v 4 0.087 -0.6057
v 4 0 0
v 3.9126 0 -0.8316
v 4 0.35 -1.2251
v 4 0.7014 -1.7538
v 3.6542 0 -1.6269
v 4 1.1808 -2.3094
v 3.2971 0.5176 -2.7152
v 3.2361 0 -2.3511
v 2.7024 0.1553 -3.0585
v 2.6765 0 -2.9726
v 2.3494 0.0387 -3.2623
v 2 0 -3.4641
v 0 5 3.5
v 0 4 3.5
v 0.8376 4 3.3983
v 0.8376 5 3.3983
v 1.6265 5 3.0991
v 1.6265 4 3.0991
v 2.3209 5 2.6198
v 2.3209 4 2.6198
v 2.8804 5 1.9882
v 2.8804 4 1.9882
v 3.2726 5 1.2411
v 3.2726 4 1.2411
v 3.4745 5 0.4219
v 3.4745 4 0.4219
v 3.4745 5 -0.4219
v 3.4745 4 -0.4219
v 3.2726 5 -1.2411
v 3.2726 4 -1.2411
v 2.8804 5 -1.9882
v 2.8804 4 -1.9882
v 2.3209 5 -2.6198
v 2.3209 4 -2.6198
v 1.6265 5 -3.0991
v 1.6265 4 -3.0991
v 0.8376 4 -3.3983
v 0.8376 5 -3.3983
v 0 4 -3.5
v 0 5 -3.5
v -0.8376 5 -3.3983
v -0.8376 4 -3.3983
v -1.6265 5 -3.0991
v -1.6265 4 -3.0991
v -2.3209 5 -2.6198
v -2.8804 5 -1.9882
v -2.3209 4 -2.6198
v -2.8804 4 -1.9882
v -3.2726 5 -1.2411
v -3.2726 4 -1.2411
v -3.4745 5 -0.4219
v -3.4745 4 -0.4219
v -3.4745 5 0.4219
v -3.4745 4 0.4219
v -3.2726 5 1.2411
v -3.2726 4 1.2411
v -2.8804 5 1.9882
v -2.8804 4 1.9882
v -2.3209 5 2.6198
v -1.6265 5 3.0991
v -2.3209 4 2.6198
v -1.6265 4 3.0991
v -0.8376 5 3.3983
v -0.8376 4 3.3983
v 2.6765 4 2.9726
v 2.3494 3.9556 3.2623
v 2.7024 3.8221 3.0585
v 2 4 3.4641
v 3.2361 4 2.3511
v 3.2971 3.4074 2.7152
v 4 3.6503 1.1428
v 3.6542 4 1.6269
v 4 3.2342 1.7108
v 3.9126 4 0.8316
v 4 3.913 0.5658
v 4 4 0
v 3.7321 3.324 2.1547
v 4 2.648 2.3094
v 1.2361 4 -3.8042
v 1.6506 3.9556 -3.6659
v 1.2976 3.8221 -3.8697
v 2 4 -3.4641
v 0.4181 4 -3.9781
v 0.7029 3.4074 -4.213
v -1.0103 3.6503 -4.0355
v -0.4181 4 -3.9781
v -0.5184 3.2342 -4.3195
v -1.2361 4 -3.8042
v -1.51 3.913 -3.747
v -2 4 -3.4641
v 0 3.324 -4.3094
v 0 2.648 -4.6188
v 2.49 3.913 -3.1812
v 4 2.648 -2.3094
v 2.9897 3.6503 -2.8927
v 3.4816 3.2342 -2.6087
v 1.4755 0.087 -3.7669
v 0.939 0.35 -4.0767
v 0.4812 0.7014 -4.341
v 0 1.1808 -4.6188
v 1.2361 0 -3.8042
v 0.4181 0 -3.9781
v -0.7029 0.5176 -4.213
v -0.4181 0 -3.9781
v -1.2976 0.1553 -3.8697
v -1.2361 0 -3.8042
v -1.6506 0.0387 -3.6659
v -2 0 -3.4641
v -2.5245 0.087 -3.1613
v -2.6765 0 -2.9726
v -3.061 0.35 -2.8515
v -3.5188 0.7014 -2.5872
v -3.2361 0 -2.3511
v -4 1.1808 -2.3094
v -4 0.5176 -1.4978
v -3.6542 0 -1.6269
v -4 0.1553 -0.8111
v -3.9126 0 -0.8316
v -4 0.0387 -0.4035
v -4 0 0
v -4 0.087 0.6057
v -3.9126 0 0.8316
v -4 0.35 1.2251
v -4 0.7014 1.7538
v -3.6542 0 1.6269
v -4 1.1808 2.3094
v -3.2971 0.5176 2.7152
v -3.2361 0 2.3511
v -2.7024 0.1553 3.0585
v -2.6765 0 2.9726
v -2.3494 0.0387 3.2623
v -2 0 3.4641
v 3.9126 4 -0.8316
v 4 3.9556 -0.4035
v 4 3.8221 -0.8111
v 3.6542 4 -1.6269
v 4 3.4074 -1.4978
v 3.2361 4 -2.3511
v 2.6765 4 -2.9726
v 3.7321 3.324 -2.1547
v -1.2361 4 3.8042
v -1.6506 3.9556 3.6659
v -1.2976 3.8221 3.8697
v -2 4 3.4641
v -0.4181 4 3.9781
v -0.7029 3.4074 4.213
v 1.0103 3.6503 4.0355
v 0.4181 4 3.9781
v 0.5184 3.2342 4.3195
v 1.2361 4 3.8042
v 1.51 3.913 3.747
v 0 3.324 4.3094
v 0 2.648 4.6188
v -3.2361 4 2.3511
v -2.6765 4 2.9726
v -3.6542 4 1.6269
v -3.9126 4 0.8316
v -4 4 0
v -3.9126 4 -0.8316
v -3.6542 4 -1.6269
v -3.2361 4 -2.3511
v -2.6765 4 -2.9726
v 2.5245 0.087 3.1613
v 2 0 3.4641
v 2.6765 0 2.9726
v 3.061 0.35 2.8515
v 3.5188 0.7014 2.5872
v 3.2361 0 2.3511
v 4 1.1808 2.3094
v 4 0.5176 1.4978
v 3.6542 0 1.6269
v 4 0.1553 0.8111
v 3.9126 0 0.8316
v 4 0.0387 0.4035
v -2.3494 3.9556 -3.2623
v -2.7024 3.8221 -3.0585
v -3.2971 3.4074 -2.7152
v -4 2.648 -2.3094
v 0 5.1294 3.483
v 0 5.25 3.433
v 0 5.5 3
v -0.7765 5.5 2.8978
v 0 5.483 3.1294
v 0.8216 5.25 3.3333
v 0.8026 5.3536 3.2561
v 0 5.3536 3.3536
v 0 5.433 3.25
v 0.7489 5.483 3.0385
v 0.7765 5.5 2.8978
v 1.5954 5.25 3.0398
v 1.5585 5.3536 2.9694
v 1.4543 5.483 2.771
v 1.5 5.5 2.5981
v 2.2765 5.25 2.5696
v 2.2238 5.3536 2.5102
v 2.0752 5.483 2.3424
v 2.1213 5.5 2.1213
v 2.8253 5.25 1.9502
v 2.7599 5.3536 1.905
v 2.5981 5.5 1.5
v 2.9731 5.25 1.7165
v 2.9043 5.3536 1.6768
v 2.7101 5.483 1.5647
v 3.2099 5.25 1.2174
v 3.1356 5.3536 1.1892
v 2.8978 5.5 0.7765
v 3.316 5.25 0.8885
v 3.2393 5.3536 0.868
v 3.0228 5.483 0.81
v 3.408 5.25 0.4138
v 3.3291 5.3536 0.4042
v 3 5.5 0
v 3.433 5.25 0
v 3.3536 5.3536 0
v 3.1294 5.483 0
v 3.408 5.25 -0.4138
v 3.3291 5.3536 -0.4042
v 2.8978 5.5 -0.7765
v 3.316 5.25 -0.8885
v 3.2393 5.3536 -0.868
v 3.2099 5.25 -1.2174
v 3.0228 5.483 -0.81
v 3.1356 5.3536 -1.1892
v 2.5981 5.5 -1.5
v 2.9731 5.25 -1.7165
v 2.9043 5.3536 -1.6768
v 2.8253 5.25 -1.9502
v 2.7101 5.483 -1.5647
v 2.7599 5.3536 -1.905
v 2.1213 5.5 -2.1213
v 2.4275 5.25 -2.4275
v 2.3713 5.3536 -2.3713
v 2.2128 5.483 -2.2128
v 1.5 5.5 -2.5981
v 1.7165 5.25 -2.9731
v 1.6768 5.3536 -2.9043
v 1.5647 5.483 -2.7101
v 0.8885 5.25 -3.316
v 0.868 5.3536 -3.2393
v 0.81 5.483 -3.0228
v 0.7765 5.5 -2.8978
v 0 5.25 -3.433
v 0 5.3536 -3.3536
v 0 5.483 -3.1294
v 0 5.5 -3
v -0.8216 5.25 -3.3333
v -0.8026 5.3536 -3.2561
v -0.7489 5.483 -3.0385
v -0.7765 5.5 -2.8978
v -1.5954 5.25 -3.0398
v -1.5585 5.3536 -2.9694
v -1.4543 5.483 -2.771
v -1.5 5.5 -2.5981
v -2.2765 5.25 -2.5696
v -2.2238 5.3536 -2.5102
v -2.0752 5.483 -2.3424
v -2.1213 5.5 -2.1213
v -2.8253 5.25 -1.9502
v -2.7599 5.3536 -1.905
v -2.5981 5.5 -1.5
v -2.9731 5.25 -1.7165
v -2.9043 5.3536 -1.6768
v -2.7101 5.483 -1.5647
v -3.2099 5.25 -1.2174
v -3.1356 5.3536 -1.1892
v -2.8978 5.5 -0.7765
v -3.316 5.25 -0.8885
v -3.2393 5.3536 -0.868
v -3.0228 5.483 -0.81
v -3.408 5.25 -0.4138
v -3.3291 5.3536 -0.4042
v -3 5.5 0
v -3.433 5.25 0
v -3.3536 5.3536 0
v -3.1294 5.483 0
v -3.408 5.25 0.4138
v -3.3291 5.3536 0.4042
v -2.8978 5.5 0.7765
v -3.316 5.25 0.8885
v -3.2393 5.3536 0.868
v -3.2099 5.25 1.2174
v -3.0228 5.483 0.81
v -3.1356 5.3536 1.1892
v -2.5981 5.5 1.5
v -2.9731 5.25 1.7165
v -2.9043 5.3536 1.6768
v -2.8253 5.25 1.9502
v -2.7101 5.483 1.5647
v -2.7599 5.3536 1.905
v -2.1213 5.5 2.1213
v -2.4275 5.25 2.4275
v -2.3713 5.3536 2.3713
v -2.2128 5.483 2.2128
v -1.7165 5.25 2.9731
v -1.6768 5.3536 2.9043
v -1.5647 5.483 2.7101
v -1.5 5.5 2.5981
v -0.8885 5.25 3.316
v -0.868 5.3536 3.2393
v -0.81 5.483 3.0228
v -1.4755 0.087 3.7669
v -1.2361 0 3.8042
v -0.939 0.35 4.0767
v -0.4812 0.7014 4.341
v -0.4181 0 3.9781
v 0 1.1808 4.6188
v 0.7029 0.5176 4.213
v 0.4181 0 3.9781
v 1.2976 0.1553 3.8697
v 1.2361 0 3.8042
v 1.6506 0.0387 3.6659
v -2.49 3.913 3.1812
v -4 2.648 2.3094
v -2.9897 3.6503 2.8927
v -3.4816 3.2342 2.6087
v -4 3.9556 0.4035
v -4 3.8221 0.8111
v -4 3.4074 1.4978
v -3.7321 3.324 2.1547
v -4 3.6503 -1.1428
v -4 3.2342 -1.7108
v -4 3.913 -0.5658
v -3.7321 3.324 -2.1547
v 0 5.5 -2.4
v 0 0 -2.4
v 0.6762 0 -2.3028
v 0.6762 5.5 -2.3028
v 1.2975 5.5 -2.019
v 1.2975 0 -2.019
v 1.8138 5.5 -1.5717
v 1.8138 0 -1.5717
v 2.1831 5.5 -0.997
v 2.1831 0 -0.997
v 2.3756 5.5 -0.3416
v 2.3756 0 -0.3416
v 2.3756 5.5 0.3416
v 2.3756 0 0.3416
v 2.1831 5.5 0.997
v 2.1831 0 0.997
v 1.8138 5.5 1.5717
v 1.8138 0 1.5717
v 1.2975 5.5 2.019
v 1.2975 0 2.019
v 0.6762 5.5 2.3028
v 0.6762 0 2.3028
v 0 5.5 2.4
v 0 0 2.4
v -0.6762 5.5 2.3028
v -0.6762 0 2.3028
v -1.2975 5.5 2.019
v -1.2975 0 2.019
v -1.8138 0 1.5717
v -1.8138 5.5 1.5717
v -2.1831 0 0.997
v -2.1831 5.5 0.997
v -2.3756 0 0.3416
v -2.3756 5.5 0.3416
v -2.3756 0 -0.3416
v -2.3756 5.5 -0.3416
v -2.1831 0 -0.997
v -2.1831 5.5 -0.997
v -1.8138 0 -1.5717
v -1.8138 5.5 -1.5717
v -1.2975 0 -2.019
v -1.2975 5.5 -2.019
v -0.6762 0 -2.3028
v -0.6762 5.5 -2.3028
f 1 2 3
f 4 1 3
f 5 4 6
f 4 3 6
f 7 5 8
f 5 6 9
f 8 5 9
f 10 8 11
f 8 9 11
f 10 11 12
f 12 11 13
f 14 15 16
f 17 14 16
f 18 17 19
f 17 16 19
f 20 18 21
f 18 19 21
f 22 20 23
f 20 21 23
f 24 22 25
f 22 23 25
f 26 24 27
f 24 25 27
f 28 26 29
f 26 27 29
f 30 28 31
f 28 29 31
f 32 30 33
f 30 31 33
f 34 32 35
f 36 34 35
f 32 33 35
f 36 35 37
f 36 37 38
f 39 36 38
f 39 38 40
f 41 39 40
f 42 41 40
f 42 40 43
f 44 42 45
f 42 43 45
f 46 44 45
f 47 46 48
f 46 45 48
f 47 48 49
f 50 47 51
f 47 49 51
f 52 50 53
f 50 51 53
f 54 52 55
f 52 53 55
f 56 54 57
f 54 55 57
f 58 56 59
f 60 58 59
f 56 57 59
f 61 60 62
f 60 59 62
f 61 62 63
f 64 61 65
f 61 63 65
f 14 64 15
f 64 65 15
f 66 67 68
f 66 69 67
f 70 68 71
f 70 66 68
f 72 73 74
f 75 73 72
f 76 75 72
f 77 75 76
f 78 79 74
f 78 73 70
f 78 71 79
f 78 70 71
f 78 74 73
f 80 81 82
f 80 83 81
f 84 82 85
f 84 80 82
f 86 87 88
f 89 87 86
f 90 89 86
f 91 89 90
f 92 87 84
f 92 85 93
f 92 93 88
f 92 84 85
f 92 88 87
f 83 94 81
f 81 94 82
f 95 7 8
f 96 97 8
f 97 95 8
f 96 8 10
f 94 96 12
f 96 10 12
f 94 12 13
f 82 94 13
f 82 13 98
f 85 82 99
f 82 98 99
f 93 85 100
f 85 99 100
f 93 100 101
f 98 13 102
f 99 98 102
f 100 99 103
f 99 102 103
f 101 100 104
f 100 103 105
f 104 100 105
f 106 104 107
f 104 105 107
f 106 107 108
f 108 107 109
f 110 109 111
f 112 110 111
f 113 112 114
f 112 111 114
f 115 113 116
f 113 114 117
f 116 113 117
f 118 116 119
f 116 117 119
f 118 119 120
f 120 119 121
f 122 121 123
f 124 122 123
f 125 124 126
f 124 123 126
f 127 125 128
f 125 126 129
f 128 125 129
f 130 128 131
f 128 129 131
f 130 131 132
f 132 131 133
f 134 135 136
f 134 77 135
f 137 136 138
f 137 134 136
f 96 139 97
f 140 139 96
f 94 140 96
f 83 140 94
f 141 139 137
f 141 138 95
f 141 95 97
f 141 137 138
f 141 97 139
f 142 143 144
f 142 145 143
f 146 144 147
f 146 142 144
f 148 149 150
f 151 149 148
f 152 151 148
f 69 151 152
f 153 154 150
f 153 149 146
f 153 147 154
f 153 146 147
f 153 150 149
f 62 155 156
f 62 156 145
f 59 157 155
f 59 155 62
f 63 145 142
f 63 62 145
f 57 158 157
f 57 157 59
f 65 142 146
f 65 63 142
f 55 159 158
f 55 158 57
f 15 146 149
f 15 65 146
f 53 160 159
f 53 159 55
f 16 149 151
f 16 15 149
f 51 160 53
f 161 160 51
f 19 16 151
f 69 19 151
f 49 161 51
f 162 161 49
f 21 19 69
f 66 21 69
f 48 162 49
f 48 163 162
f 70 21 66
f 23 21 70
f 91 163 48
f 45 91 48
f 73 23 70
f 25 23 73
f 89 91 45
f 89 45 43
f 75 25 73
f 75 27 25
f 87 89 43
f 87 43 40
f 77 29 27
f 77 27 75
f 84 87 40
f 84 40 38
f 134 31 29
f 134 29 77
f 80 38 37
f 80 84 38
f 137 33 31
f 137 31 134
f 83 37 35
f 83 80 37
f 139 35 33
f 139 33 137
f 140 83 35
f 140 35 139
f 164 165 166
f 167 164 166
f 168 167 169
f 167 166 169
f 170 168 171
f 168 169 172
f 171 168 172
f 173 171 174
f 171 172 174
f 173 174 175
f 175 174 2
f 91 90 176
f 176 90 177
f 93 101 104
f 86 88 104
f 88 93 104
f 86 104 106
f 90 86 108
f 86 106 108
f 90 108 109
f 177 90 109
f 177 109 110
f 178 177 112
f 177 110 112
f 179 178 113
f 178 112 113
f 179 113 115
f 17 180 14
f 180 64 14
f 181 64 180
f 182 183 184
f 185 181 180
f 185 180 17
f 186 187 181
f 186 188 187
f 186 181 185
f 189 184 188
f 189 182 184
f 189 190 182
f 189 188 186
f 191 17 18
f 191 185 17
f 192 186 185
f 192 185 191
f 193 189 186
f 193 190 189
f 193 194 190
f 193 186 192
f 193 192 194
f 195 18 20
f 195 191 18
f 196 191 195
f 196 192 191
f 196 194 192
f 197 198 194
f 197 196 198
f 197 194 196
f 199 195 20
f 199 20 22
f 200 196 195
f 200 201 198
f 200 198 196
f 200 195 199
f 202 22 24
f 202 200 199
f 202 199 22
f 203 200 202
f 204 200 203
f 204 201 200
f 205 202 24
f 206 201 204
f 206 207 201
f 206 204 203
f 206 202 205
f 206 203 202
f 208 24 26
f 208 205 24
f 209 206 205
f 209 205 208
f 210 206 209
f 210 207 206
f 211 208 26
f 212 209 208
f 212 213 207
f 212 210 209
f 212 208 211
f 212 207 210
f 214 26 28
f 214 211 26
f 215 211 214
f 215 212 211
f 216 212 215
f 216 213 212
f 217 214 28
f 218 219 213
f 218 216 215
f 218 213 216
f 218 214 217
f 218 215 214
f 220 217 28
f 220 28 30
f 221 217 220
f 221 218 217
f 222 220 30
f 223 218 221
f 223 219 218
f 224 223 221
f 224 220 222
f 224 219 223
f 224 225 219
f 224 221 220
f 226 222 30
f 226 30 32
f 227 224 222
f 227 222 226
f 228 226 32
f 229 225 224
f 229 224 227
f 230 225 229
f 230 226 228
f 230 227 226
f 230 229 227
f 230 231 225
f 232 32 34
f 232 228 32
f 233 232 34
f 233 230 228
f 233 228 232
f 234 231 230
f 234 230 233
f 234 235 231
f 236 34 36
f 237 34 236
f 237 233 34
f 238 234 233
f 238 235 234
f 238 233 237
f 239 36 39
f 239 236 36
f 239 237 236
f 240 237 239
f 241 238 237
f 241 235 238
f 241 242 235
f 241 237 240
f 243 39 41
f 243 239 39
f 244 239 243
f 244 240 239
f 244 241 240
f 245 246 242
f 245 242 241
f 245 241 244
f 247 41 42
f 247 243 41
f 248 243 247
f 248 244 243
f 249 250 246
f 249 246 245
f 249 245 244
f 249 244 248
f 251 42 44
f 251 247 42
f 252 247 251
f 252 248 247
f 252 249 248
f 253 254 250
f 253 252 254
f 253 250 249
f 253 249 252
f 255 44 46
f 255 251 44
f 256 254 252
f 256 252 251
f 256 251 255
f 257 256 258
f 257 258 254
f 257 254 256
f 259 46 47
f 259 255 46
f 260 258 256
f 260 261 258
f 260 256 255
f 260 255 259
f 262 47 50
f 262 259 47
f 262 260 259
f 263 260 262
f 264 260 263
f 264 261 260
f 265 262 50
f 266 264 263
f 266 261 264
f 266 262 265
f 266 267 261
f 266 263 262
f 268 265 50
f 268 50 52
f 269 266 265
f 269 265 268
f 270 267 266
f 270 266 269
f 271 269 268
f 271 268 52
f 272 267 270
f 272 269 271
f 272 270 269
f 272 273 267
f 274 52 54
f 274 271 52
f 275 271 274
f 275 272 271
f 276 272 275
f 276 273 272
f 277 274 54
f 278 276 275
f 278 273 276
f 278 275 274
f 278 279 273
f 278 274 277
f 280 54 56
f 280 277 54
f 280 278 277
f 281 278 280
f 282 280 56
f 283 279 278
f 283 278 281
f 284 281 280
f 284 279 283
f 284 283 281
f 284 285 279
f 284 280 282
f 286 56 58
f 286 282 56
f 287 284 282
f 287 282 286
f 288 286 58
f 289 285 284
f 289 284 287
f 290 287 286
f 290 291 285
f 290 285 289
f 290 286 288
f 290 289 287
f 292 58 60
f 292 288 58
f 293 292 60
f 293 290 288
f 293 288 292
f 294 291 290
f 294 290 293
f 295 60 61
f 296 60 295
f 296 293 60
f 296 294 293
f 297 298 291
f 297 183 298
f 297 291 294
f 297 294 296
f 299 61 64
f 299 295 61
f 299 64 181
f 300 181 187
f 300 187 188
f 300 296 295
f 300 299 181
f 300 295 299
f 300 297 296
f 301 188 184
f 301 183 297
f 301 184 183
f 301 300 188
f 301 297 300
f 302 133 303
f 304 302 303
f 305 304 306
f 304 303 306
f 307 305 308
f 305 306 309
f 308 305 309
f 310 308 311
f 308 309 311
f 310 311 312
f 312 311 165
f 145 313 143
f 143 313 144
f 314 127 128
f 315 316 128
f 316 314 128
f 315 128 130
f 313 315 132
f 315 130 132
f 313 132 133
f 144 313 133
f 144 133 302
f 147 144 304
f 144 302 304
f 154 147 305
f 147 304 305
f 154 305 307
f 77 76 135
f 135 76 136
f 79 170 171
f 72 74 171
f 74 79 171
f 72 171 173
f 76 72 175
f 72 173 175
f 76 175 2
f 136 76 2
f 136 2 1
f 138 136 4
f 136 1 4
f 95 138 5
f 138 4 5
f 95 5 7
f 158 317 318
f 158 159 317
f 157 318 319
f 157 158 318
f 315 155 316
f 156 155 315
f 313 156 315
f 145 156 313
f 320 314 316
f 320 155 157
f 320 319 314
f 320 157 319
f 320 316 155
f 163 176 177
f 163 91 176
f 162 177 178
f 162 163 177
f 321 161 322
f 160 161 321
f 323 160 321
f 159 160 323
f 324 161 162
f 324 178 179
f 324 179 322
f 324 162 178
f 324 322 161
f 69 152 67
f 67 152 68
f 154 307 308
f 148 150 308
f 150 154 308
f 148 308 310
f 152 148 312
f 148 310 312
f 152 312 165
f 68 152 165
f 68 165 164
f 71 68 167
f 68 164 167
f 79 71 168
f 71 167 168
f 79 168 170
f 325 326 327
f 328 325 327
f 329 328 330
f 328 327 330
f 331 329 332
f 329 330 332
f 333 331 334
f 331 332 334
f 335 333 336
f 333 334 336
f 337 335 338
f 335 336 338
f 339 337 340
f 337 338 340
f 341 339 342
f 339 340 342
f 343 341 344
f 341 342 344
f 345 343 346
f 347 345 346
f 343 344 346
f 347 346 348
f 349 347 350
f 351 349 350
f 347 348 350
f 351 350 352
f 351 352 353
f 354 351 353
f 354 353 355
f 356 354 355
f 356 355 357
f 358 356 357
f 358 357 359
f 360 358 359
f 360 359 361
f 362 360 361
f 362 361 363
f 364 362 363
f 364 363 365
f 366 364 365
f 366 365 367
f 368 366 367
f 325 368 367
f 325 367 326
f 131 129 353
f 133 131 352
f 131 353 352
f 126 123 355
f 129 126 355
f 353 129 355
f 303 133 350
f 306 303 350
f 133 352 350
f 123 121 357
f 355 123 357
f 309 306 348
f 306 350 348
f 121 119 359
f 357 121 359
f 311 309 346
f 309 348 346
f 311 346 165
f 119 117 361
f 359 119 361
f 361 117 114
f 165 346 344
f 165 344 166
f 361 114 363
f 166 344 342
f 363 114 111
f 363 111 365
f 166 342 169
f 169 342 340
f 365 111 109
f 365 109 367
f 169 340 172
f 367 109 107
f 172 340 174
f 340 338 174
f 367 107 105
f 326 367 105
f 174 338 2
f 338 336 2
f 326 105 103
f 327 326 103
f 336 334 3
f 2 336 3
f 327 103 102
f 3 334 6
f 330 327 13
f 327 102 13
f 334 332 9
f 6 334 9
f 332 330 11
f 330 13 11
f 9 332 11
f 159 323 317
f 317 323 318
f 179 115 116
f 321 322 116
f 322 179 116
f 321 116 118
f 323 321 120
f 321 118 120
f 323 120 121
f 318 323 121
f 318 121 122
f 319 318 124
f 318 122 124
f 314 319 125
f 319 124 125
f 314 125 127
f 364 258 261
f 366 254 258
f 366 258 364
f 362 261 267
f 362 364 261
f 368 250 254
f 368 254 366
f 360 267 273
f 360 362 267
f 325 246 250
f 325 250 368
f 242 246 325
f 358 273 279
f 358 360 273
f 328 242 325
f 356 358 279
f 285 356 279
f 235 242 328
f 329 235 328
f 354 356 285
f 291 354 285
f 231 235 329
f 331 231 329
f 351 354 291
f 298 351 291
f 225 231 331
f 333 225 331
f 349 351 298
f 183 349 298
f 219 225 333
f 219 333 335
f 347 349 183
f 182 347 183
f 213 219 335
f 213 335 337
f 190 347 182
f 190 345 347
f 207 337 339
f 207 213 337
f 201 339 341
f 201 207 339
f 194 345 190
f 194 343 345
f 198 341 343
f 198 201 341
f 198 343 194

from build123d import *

# Parameters (mm, degrees)
EXTRUDE_1_DEPTH     = 4
SKETCH_2_R          = 3.5
EXTRUDE_2_DEPTH     = 1.5
FILLET_1_R          = 0.5
SKETCH_3_R          = 2.4
CUT_EXTRUDE_1_DEPTH = 9.220908303


with BuildPart() as part:
    # 草图1 → 凸台-拉伸1 (new body)
    with BuildSketch(Plane(origin=(0, 0, 0), x_dir=(1, 0, 0), z_dir=(0, 1, 0))):
        Polygon((4, 2.309401077), (0, 4.618802154), (-4, 2.309401077), (-4, -2.309401077), (0, -4.618802154), (4, -2.309401077), align=None)
    extrude(amount=EXTRUDE_1_DEPTH)

    # 草图2 → 凸台-拉伸2 (add)
    with BuildSketch(Plane(origin=(0, 4, 0), x_dir=(1, 0, 0), z_dir=(0, 1, 0))):
        with Locations(Location((0, 0, 0), (0, 0, 270))):
            Circle(SKETCH_2_R)
    extrude(amount=EXTRUDE_2_DEPTH)

    # 圆角1
    fillet_1_edges = [part.edges().sort_by_distance(p)[0] for p in [
        (0, 5.5, -3.5),
    ]]
    fillet(fillet_1_edges, radius=FILLET_1_R)

    # 草图3 → 切除-拉伸1 (cut, through all)
    with BuildSketch(Plane.XZ):
        with Locations(Location((0, 0, 0), (0, 0, 270))):
            Circle(SKETCH_3_R)
    extrude(amount=-CUT_EXTRUDE_1_DEPTH, mode=Mode.SUBTRACT)

    # 草图4 → 切除-旋转1 (revolve, cut)
    with BuildSketch(Plane.XY):
        Polygon((4.708641342, 0), (4.708641342, 1.352262465), (4, 0), align=None)
        Polygon((4, 4), (4.708641342, 4), (4.708641342, 2.451754507), align=None)
    revolve(axis=Axis((0, 0, 0), (0, 1, 0)), mode=Mode.SUBTRACT)


solid = part.part
